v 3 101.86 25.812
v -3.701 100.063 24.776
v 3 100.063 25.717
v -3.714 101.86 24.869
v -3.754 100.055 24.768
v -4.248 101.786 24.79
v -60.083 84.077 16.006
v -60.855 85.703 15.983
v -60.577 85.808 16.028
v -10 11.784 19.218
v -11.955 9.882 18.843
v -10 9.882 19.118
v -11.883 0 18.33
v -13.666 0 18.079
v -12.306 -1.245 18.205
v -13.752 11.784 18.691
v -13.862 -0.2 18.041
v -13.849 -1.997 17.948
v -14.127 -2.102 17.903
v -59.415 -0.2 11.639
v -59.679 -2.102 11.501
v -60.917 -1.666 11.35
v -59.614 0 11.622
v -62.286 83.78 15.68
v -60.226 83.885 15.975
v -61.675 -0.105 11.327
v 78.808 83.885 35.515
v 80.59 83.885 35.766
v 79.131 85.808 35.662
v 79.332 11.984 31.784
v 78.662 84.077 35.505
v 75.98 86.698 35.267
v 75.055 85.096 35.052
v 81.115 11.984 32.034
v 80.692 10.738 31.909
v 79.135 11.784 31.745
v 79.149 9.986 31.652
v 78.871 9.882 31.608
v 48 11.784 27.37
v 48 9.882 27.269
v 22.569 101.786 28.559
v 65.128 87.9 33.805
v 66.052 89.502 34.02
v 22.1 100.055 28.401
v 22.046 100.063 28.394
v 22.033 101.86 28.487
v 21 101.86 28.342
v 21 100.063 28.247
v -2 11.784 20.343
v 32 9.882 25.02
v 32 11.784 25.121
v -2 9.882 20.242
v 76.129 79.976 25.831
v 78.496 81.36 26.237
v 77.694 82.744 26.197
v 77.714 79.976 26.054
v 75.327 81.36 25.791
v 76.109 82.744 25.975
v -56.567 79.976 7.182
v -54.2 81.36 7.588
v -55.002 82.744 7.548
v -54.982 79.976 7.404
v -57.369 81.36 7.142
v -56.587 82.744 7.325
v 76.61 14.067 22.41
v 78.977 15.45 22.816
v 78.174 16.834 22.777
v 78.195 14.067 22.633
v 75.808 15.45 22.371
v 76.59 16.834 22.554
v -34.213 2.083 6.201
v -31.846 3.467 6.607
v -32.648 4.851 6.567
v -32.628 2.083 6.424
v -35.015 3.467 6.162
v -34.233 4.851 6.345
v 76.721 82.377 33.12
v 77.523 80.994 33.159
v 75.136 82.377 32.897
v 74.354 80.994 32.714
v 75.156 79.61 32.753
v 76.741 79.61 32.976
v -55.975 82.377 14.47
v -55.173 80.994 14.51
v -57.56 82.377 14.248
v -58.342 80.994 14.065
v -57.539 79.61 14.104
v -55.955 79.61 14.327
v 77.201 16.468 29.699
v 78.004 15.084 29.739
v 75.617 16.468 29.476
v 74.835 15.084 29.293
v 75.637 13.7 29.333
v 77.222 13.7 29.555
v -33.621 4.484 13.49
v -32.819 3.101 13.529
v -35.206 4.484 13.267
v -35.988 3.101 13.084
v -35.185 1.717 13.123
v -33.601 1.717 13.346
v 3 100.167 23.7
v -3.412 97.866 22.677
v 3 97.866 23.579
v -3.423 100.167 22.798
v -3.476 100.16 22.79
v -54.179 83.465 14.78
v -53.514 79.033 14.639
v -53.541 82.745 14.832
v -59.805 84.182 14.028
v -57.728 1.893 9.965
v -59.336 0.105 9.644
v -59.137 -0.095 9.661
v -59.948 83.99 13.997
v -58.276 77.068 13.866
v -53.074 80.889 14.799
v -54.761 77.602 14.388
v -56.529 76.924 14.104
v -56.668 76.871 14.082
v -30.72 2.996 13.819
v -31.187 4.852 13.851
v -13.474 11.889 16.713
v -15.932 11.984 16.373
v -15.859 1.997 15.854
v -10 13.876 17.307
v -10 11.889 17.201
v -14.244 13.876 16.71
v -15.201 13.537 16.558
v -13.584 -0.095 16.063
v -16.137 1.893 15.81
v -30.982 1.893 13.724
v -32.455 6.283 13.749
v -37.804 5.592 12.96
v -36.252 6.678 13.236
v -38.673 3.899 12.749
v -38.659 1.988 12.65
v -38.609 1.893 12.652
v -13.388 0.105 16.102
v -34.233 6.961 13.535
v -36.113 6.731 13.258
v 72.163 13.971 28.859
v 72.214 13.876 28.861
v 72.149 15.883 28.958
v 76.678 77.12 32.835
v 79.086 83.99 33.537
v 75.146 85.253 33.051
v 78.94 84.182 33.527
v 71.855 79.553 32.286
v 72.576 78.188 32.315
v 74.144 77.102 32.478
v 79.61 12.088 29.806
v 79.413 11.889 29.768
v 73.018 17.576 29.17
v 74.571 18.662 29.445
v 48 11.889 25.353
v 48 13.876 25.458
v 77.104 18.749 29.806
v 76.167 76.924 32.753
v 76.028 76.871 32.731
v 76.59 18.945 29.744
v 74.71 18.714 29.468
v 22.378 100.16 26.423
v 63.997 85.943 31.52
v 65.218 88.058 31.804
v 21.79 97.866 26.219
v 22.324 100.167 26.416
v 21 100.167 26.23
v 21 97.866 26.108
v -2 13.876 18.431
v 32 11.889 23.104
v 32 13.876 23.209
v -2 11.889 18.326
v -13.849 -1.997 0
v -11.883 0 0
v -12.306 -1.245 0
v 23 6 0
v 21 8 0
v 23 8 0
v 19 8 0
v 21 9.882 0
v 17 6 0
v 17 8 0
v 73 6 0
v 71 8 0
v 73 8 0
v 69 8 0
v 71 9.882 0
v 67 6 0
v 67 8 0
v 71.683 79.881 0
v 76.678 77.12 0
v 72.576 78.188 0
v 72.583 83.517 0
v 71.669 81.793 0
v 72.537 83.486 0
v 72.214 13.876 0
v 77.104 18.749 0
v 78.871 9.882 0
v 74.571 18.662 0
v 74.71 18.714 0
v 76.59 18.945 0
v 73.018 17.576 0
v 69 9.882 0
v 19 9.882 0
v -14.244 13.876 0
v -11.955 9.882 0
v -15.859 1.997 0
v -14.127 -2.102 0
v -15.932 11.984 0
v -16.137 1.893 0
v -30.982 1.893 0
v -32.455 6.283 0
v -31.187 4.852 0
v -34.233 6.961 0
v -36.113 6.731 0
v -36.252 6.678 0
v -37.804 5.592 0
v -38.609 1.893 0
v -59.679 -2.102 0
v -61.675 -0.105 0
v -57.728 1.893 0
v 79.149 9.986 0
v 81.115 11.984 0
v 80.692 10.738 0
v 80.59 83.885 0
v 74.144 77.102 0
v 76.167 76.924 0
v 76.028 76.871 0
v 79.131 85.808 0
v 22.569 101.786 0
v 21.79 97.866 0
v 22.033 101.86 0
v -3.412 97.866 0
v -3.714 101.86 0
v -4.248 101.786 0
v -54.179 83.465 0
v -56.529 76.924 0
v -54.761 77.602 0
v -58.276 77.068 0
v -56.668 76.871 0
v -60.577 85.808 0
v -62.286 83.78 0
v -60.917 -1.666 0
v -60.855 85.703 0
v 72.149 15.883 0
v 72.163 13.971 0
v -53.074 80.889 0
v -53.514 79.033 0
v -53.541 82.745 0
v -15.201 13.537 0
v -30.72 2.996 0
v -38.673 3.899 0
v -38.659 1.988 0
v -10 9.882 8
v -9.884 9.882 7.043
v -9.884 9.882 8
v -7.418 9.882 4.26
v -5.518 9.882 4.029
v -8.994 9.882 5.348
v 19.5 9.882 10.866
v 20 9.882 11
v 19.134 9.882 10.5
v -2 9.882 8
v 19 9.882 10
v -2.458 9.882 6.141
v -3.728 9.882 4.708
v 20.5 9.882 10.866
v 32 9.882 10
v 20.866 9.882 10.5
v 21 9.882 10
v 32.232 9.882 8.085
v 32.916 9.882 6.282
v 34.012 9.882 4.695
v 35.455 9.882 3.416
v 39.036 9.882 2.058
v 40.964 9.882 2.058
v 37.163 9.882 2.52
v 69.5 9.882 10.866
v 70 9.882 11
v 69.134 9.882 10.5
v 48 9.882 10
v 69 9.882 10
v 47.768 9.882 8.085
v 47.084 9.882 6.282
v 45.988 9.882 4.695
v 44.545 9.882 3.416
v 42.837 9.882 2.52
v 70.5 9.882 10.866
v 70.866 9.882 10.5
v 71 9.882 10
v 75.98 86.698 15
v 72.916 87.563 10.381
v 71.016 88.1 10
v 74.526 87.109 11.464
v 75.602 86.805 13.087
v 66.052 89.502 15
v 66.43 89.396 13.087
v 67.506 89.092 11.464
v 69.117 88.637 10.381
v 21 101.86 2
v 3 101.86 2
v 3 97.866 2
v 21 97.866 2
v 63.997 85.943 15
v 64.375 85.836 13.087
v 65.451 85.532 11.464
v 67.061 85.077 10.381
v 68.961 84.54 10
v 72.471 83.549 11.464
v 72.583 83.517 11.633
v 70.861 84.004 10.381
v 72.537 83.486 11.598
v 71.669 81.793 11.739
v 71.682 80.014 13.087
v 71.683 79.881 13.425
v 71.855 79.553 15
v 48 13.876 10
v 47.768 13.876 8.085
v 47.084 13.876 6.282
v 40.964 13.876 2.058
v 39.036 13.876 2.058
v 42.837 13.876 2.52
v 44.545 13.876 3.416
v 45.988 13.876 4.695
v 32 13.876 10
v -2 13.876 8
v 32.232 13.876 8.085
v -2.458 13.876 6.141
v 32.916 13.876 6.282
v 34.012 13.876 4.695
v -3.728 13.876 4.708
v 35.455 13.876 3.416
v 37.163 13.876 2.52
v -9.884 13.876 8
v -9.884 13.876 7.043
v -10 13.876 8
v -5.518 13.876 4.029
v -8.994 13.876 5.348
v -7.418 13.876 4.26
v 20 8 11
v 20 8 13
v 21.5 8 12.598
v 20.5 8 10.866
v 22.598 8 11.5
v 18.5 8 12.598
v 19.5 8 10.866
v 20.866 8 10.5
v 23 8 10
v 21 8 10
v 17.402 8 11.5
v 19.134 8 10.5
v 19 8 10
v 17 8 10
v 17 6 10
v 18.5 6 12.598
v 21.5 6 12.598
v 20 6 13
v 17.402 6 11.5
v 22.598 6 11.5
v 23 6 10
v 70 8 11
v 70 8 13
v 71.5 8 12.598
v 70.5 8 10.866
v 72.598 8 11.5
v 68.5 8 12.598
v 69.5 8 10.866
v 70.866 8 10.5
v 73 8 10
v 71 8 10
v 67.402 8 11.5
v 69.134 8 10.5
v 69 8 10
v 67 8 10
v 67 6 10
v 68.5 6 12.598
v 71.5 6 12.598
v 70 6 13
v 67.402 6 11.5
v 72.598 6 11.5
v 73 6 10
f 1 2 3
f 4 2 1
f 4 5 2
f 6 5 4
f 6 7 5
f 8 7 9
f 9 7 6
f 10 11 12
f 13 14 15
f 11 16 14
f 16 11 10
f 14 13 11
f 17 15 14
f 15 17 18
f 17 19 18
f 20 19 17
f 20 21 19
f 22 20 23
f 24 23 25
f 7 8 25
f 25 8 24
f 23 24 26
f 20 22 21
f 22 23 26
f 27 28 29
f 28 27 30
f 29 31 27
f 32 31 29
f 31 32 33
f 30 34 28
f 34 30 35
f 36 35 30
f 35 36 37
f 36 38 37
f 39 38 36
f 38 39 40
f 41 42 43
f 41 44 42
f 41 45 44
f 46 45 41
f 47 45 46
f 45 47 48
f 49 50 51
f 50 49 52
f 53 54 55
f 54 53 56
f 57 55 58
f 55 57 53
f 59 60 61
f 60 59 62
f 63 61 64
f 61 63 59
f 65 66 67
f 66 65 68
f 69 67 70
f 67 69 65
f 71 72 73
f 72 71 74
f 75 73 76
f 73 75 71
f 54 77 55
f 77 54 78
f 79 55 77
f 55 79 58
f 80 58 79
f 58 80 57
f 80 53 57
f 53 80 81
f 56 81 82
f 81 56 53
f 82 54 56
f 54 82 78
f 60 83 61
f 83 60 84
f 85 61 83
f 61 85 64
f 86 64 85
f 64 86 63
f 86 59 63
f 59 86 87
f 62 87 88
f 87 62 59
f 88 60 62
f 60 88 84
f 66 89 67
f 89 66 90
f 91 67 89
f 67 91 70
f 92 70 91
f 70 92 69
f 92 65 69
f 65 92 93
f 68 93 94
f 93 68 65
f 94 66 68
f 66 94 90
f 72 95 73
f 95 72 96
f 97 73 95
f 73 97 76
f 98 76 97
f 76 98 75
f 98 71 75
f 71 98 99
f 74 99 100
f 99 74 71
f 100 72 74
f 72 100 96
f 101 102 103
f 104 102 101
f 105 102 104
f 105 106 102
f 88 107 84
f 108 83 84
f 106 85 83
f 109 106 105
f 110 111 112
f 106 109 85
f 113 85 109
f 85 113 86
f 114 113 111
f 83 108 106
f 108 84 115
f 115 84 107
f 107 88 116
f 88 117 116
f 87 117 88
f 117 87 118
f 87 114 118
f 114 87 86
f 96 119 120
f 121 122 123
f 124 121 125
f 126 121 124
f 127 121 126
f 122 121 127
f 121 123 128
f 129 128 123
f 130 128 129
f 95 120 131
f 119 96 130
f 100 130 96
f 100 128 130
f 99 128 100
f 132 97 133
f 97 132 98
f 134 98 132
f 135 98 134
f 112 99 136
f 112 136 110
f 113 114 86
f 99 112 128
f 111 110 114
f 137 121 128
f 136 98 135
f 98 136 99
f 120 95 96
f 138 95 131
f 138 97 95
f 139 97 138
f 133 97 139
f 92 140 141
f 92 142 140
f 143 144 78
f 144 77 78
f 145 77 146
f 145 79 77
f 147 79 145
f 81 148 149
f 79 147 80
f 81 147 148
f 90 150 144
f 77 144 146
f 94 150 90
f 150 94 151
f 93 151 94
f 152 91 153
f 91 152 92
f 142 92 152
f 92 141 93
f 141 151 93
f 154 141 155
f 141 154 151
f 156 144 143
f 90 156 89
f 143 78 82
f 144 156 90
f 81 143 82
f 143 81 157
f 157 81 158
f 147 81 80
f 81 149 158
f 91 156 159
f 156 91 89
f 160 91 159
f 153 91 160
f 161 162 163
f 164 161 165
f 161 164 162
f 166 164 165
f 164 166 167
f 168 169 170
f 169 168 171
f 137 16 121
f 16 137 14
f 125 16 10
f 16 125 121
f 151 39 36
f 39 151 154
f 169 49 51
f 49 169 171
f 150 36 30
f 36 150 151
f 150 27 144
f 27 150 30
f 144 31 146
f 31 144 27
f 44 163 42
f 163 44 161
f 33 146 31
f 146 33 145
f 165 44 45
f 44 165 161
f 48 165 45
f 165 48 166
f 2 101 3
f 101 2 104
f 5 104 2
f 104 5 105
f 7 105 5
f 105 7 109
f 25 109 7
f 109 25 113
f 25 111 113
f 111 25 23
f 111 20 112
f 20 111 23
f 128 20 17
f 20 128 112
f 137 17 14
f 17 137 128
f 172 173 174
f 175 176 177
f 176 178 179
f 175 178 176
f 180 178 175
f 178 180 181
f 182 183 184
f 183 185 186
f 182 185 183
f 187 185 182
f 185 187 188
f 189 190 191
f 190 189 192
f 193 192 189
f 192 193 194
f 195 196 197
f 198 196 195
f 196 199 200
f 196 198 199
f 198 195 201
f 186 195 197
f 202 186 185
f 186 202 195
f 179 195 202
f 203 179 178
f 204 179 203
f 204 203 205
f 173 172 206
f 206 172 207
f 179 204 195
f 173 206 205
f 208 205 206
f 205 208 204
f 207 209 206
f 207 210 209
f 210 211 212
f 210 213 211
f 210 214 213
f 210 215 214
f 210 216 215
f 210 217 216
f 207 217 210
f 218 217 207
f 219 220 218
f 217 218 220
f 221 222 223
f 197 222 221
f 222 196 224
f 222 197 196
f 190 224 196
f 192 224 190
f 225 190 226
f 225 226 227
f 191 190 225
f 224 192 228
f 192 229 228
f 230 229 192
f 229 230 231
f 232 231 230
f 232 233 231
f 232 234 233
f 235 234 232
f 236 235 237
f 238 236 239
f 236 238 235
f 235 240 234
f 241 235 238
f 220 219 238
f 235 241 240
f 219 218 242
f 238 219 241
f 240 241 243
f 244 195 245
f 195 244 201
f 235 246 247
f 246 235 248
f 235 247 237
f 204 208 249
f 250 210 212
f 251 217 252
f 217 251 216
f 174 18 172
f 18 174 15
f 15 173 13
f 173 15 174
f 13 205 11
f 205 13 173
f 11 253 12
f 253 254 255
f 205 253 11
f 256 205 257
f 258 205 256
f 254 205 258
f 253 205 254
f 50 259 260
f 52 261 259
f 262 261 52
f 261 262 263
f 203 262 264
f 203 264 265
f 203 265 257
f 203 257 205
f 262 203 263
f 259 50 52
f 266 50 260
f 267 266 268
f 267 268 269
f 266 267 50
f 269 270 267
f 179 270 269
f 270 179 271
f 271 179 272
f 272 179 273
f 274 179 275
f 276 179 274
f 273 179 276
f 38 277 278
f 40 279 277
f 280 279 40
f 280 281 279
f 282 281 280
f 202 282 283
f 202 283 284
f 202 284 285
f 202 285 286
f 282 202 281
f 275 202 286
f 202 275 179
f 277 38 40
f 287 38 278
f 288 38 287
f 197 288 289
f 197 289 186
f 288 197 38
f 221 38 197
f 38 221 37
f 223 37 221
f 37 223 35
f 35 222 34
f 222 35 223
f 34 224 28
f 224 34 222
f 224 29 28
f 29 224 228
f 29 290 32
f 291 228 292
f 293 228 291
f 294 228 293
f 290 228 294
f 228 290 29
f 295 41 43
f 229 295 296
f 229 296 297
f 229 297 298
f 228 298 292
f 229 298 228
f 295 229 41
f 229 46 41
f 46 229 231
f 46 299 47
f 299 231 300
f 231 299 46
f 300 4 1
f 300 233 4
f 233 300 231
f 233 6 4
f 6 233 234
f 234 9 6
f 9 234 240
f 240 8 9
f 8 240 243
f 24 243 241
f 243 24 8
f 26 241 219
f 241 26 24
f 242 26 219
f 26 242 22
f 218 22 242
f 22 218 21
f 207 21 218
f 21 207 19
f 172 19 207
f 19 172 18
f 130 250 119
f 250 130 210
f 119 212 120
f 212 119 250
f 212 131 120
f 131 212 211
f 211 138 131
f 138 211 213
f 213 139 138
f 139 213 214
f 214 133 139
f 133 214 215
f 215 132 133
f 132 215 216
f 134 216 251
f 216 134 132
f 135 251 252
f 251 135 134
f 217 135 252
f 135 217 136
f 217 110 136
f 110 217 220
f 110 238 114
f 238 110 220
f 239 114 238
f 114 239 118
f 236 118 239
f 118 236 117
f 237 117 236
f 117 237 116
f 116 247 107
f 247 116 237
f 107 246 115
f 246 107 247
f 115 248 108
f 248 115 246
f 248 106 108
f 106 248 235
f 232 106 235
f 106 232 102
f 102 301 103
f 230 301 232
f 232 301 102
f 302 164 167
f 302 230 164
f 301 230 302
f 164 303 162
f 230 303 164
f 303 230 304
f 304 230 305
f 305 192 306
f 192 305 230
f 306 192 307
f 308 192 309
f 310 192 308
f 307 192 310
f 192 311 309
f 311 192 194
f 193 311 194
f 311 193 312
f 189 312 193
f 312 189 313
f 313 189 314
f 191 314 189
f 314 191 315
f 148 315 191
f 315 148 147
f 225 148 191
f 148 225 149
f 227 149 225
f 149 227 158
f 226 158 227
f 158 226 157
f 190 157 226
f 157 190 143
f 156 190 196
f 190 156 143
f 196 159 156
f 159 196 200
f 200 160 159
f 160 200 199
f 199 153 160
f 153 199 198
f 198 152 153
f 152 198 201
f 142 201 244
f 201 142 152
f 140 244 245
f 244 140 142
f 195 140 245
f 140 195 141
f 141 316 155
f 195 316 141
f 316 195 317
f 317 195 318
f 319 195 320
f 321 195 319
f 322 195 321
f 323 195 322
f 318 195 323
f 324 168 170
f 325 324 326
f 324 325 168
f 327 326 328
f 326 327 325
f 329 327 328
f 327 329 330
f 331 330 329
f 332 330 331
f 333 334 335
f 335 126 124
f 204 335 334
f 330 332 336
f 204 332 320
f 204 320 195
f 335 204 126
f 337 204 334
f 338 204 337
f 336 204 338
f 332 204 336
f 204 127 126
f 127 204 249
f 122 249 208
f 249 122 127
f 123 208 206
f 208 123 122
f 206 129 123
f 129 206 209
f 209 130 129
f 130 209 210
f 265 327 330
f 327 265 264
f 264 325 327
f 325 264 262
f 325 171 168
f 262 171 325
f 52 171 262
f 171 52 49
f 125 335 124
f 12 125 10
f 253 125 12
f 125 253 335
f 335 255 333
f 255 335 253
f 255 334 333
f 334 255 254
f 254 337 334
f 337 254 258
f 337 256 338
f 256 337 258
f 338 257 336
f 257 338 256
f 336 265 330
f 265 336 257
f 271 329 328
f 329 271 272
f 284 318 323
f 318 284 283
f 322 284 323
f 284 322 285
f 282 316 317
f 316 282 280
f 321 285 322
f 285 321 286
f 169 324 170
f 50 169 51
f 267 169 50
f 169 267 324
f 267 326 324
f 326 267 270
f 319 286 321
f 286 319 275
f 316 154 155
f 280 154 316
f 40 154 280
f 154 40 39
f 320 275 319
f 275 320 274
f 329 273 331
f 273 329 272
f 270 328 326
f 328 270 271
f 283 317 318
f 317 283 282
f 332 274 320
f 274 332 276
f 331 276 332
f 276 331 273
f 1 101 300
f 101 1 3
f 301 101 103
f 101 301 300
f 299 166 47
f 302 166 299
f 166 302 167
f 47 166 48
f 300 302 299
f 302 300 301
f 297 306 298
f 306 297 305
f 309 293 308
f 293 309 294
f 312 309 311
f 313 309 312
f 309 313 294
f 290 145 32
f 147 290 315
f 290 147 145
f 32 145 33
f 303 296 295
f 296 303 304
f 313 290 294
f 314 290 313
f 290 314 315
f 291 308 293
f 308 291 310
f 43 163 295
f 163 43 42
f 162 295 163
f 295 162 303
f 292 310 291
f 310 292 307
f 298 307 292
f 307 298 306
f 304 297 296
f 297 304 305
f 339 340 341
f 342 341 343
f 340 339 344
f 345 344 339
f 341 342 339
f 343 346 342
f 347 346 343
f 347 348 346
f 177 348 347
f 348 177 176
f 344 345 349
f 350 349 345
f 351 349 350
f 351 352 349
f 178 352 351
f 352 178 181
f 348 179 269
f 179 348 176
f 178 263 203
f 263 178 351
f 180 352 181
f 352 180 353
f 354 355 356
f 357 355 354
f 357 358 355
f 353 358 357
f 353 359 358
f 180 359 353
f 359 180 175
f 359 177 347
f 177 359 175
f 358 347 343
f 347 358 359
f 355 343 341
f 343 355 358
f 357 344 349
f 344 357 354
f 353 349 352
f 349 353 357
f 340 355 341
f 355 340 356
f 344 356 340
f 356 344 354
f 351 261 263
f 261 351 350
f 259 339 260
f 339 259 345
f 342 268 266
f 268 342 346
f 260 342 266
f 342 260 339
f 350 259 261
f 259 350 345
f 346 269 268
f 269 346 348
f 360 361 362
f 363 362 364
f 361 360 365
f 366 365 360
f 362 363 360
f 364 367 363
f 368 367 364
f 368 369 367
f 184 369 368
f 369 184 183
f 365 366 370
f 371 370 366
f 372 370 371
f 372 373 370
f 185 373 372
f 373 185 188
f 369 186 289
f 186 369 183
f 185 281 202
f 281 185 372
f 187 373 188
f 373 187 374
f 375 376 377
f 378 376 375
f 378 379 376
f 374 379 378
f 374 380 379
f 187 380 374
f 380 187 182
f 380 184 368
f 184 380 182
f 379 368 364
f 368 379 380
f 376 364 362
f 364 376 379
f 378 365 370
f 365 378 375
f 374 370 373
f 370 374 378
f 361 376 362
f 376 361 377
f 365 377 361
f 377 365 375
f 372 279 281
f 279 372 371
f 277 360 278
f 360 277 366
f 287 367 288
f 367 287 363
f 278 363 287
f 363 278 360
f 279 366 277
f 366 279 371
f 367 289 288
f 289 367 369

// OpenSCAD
// file: common.scad
module keyswitch_hole(x=0, y=0, a=0) {
    translate([x, y, 0]) {
        rotate([0, 0, 90+a]) {
            linear_extrude(height = 2) {
            square([14, 14], center = true);
            //translate([-8, 3, 0]) square([1, 3]);
            //translate([-8, -6, 0]) square([1, 3]);
            //translate([7, 3, 0]) square([1, 3]);
            //translate([7, -6, 0]) square([1, 3]);
            }
            linear_extrude(height = 0.6) {
                translate([-3, 7]) square([6, 1]);
            translate([-3, -8]) square([6, 1]);
            }
        }
    }
}

keyswitch_hole();

module joint_male_face() {
    translate([-1, 0])
    square([2,4]);
    translate([-3, 2])
    square([6,2]);
}

module joint_male(pos=[0,0]) {
    translate(pos){
      rotate([0,0,180]){
        linear_extrude(height=10)
        joint_male_face();
        
        translate([0,2,10])
        rotate([-90,0,0])
        linear_extrude(height=2)
        circle(3, $fn=12);
        
        translate([0,0,10])
        rotate([-90,0,0])
        linear_extrude(height=2)
        circle(1, $fn=12);
      }
    }
}

module joint_female(pos=[0,0]) {
    delta = 0.5;
    translate(pos){
      rotate([0,0,180]){
        linear_extrude(height=10)
        offset(delta=delta)
        joint_male_face();
        
        translate([0,1.6,10])
        rotate([-90,0,0])
        linear_extrude(height=2.8)
        offset(delta=delta)
        circle(3, $fn=12);

        translate([0,-0.4,10])
        rotate([-90,0,0])
        linear_extrude(height=2.8)
        offset(delta=delta)
        circle(1, $fn=12);
      }
    }
}


joint_male([20, 0]);
joint_female([30, 0]);
// main file
use <common.scad>;

UNIT = 19;
UNIT_H = UNIT / 2;
UNIT_Q = UNIT / 4;
UNIT_E = UNIT / 8;

KEY_OFFSET_X = 10;
KEY_OFFSET_Y = 8;

finger_plate_points = [
    [-60,0],
    [-14,0],
    [-14,12],
    [80, 12],
    [80, 84],
    [23, 100],
    [-3, 100],
    [-60, 84],
];

finger_plate_sc_points = [
    [-35, 3],
    [80-3, 12+3],
    [80-3, 84 - 3],
    [-60+3, 84 - 3],
];

module finger_plate_nohole() {
    linear_extrude(height = 2)
    polygon(points=finger_plate_points);
}

module keyswitch_col(x=0,y=0,c=3,a=0) {
    rotate([0, 0, a])
    for (i = [0:c-1]) {
        keyswitch_hole(x, y+19*i);
    }
}

module finger_plate_holes() {
    // G
    GX = KEY_OFFSET_X - UNIT * 3;
    GY = KEY_OFFSET_Y + UNIT_Q;
    echo("G: ", GX, GY);
    keyswitch_col(GX, GY, 4);
    // F
    FX = KEY_OFFSET_X- UNIT * 2;
    FY = KEY_OFFSET_Y + UNIT_H;
    echo("F: ", FX, FY);
    keyswitch_col(FX, FY, 4);
    // E
    EX = KEY_OFFSET_X - UNIT;
    EY = KEY_OFFSET_Y + UNIT_H + UNIT_Q + UNIT_Q;
    echo("E: ", EX, EY);
    keyswitch_col(EX, EY, 4);
    // D
    DX = KEY_OFFSET_X;
    DY = KEY_OFFSET_Y + UNIT + UNIT_Q;
    echo("D: ", DX, DY);
    keyswitch_col(DX, DY, 4);
    // C
    CX = KEY_OFFSET_X+ UNIT;
    CY = KEY_OFFSET_Y + UNIT;
    echo("C: ", CX, CY);
    keyswitch_col(CX, CY, 4);
    // B
    BX = KEY_OFFSET_X+UNIT * 2;
    BY = KEY_OFFSET_Y+ UNIT_H + UNIT_Q;
    echo("B: ", BX, BY);
    keyswitch_col(BX, BY, 4);
    // A
    AX = KEY_OFFSET_X+UNIT*3;
    AY = KEY_OFFSET_Y+UNIT + UNIT_Q;
    echo("A: ", AX, AY);
    keyswitch_col(AX, AY, 1);
    echo("A2: ", AX, AY + UNIT + UNIT_Q);
    keyswitch_col(AX, AY + UNIT + UNIT_Q, 1);  
    for(p=finger_plate_sc_points){
        linear_extrude(height=5)
            translate(p)
            circle(1.6);
    }
}

module finger_plate() {
    difference() {
        finger_plate_nohole();
        finger_plate_holes();
    }
}

//tilt_angle = [-5,-5,0];
tilt_angle = [3,-8,0];
tilt_angle_r = tilt_angle * -1;
echo(tilt_angle_r);

//height = 15;
height = 20;

module finger_case_outer_face() {
    projection()
        translate([0,0,height])
        rotate(tilt_angle)
        linear_extrude(height=2)
        offset(2)
        polygon(points=finger_plate_points);
}

module finger_case_inner_face() {
    projection()
        translate([0,0,height])
        rotate(tilt_angle)
        linear_extrude(height=2)
        offset(-2)
        polygon(points=finger_plate_points);
}

module finger_case_bottom_face() {
    difference() {
        finger_case_outer_face();
        finger_case_inner_face();
    }
    projection()
    translate([0,0,height])
    rotate(tilt_angle)
    for(p=finger_plate_sc_points){
        linear_extrude(height=1)
        translate(p)
        circle(4);
    }
}


module finger_case_nohole() {
    difference() {
        linear_extrude(height=50)
        finger_case_bottom_face();
    
        translate([0,0,height])
        rotate(tilt_angle){
            linear_extrude(height=50)
            square(300, center=true);
            // sc hole
            translate([0,0,-9])
            linear_extrude(height=9)
            for(p=finger_plate_sc_points){
                translate(p)
                circle(1.6);
            }
            // plate_hole
            translate([0,0,-2])
            linear_extrude(height=2)
            offset(0.2)
            polygon(points=finger_plate_points);
        }
    }
}

module finger_case_hole() {
    // cable hole
    translate([-6,20,0])
    rotate([90,0,0])
    linear_extrude(height=20) {
        translate([0, 8])
        circle(4);
        translate([-4,8])
        square([8, 30]);
    }
    translate([40,15,0])
    rotate([90,0,0])
    linear_extrude(height=20){
        translate([0, 10])
        circle(8);
        translate([-8,10])
        square([16, 30]);
    }
    // USB hole
    translate([12,110,0])
    rotate([90,0,0])
    linear_extrude(height=20) {
        //translate([0, 10])
        //circle(9);
        translate([-9, 2])
        square([18, 30]);
    }
    // TRRS hole
    translate([75,95,0])
    rotate([90,0,-30])
    linear_extrude(height=20) {
        translate([0, 15])
        circle(5);
        translate([-5, 15])
        square([10, 30]);
    }
}

module finger_case() {
    difference() {
        finger_case_nohole();
        finger_case_hole();
    }
    for (x = [20, 70]) {
        joint_male([x, 10]);
    }
}

finger_case();

//translate([0,-10])
//rotate([180,0,0])
//finger_plate();
